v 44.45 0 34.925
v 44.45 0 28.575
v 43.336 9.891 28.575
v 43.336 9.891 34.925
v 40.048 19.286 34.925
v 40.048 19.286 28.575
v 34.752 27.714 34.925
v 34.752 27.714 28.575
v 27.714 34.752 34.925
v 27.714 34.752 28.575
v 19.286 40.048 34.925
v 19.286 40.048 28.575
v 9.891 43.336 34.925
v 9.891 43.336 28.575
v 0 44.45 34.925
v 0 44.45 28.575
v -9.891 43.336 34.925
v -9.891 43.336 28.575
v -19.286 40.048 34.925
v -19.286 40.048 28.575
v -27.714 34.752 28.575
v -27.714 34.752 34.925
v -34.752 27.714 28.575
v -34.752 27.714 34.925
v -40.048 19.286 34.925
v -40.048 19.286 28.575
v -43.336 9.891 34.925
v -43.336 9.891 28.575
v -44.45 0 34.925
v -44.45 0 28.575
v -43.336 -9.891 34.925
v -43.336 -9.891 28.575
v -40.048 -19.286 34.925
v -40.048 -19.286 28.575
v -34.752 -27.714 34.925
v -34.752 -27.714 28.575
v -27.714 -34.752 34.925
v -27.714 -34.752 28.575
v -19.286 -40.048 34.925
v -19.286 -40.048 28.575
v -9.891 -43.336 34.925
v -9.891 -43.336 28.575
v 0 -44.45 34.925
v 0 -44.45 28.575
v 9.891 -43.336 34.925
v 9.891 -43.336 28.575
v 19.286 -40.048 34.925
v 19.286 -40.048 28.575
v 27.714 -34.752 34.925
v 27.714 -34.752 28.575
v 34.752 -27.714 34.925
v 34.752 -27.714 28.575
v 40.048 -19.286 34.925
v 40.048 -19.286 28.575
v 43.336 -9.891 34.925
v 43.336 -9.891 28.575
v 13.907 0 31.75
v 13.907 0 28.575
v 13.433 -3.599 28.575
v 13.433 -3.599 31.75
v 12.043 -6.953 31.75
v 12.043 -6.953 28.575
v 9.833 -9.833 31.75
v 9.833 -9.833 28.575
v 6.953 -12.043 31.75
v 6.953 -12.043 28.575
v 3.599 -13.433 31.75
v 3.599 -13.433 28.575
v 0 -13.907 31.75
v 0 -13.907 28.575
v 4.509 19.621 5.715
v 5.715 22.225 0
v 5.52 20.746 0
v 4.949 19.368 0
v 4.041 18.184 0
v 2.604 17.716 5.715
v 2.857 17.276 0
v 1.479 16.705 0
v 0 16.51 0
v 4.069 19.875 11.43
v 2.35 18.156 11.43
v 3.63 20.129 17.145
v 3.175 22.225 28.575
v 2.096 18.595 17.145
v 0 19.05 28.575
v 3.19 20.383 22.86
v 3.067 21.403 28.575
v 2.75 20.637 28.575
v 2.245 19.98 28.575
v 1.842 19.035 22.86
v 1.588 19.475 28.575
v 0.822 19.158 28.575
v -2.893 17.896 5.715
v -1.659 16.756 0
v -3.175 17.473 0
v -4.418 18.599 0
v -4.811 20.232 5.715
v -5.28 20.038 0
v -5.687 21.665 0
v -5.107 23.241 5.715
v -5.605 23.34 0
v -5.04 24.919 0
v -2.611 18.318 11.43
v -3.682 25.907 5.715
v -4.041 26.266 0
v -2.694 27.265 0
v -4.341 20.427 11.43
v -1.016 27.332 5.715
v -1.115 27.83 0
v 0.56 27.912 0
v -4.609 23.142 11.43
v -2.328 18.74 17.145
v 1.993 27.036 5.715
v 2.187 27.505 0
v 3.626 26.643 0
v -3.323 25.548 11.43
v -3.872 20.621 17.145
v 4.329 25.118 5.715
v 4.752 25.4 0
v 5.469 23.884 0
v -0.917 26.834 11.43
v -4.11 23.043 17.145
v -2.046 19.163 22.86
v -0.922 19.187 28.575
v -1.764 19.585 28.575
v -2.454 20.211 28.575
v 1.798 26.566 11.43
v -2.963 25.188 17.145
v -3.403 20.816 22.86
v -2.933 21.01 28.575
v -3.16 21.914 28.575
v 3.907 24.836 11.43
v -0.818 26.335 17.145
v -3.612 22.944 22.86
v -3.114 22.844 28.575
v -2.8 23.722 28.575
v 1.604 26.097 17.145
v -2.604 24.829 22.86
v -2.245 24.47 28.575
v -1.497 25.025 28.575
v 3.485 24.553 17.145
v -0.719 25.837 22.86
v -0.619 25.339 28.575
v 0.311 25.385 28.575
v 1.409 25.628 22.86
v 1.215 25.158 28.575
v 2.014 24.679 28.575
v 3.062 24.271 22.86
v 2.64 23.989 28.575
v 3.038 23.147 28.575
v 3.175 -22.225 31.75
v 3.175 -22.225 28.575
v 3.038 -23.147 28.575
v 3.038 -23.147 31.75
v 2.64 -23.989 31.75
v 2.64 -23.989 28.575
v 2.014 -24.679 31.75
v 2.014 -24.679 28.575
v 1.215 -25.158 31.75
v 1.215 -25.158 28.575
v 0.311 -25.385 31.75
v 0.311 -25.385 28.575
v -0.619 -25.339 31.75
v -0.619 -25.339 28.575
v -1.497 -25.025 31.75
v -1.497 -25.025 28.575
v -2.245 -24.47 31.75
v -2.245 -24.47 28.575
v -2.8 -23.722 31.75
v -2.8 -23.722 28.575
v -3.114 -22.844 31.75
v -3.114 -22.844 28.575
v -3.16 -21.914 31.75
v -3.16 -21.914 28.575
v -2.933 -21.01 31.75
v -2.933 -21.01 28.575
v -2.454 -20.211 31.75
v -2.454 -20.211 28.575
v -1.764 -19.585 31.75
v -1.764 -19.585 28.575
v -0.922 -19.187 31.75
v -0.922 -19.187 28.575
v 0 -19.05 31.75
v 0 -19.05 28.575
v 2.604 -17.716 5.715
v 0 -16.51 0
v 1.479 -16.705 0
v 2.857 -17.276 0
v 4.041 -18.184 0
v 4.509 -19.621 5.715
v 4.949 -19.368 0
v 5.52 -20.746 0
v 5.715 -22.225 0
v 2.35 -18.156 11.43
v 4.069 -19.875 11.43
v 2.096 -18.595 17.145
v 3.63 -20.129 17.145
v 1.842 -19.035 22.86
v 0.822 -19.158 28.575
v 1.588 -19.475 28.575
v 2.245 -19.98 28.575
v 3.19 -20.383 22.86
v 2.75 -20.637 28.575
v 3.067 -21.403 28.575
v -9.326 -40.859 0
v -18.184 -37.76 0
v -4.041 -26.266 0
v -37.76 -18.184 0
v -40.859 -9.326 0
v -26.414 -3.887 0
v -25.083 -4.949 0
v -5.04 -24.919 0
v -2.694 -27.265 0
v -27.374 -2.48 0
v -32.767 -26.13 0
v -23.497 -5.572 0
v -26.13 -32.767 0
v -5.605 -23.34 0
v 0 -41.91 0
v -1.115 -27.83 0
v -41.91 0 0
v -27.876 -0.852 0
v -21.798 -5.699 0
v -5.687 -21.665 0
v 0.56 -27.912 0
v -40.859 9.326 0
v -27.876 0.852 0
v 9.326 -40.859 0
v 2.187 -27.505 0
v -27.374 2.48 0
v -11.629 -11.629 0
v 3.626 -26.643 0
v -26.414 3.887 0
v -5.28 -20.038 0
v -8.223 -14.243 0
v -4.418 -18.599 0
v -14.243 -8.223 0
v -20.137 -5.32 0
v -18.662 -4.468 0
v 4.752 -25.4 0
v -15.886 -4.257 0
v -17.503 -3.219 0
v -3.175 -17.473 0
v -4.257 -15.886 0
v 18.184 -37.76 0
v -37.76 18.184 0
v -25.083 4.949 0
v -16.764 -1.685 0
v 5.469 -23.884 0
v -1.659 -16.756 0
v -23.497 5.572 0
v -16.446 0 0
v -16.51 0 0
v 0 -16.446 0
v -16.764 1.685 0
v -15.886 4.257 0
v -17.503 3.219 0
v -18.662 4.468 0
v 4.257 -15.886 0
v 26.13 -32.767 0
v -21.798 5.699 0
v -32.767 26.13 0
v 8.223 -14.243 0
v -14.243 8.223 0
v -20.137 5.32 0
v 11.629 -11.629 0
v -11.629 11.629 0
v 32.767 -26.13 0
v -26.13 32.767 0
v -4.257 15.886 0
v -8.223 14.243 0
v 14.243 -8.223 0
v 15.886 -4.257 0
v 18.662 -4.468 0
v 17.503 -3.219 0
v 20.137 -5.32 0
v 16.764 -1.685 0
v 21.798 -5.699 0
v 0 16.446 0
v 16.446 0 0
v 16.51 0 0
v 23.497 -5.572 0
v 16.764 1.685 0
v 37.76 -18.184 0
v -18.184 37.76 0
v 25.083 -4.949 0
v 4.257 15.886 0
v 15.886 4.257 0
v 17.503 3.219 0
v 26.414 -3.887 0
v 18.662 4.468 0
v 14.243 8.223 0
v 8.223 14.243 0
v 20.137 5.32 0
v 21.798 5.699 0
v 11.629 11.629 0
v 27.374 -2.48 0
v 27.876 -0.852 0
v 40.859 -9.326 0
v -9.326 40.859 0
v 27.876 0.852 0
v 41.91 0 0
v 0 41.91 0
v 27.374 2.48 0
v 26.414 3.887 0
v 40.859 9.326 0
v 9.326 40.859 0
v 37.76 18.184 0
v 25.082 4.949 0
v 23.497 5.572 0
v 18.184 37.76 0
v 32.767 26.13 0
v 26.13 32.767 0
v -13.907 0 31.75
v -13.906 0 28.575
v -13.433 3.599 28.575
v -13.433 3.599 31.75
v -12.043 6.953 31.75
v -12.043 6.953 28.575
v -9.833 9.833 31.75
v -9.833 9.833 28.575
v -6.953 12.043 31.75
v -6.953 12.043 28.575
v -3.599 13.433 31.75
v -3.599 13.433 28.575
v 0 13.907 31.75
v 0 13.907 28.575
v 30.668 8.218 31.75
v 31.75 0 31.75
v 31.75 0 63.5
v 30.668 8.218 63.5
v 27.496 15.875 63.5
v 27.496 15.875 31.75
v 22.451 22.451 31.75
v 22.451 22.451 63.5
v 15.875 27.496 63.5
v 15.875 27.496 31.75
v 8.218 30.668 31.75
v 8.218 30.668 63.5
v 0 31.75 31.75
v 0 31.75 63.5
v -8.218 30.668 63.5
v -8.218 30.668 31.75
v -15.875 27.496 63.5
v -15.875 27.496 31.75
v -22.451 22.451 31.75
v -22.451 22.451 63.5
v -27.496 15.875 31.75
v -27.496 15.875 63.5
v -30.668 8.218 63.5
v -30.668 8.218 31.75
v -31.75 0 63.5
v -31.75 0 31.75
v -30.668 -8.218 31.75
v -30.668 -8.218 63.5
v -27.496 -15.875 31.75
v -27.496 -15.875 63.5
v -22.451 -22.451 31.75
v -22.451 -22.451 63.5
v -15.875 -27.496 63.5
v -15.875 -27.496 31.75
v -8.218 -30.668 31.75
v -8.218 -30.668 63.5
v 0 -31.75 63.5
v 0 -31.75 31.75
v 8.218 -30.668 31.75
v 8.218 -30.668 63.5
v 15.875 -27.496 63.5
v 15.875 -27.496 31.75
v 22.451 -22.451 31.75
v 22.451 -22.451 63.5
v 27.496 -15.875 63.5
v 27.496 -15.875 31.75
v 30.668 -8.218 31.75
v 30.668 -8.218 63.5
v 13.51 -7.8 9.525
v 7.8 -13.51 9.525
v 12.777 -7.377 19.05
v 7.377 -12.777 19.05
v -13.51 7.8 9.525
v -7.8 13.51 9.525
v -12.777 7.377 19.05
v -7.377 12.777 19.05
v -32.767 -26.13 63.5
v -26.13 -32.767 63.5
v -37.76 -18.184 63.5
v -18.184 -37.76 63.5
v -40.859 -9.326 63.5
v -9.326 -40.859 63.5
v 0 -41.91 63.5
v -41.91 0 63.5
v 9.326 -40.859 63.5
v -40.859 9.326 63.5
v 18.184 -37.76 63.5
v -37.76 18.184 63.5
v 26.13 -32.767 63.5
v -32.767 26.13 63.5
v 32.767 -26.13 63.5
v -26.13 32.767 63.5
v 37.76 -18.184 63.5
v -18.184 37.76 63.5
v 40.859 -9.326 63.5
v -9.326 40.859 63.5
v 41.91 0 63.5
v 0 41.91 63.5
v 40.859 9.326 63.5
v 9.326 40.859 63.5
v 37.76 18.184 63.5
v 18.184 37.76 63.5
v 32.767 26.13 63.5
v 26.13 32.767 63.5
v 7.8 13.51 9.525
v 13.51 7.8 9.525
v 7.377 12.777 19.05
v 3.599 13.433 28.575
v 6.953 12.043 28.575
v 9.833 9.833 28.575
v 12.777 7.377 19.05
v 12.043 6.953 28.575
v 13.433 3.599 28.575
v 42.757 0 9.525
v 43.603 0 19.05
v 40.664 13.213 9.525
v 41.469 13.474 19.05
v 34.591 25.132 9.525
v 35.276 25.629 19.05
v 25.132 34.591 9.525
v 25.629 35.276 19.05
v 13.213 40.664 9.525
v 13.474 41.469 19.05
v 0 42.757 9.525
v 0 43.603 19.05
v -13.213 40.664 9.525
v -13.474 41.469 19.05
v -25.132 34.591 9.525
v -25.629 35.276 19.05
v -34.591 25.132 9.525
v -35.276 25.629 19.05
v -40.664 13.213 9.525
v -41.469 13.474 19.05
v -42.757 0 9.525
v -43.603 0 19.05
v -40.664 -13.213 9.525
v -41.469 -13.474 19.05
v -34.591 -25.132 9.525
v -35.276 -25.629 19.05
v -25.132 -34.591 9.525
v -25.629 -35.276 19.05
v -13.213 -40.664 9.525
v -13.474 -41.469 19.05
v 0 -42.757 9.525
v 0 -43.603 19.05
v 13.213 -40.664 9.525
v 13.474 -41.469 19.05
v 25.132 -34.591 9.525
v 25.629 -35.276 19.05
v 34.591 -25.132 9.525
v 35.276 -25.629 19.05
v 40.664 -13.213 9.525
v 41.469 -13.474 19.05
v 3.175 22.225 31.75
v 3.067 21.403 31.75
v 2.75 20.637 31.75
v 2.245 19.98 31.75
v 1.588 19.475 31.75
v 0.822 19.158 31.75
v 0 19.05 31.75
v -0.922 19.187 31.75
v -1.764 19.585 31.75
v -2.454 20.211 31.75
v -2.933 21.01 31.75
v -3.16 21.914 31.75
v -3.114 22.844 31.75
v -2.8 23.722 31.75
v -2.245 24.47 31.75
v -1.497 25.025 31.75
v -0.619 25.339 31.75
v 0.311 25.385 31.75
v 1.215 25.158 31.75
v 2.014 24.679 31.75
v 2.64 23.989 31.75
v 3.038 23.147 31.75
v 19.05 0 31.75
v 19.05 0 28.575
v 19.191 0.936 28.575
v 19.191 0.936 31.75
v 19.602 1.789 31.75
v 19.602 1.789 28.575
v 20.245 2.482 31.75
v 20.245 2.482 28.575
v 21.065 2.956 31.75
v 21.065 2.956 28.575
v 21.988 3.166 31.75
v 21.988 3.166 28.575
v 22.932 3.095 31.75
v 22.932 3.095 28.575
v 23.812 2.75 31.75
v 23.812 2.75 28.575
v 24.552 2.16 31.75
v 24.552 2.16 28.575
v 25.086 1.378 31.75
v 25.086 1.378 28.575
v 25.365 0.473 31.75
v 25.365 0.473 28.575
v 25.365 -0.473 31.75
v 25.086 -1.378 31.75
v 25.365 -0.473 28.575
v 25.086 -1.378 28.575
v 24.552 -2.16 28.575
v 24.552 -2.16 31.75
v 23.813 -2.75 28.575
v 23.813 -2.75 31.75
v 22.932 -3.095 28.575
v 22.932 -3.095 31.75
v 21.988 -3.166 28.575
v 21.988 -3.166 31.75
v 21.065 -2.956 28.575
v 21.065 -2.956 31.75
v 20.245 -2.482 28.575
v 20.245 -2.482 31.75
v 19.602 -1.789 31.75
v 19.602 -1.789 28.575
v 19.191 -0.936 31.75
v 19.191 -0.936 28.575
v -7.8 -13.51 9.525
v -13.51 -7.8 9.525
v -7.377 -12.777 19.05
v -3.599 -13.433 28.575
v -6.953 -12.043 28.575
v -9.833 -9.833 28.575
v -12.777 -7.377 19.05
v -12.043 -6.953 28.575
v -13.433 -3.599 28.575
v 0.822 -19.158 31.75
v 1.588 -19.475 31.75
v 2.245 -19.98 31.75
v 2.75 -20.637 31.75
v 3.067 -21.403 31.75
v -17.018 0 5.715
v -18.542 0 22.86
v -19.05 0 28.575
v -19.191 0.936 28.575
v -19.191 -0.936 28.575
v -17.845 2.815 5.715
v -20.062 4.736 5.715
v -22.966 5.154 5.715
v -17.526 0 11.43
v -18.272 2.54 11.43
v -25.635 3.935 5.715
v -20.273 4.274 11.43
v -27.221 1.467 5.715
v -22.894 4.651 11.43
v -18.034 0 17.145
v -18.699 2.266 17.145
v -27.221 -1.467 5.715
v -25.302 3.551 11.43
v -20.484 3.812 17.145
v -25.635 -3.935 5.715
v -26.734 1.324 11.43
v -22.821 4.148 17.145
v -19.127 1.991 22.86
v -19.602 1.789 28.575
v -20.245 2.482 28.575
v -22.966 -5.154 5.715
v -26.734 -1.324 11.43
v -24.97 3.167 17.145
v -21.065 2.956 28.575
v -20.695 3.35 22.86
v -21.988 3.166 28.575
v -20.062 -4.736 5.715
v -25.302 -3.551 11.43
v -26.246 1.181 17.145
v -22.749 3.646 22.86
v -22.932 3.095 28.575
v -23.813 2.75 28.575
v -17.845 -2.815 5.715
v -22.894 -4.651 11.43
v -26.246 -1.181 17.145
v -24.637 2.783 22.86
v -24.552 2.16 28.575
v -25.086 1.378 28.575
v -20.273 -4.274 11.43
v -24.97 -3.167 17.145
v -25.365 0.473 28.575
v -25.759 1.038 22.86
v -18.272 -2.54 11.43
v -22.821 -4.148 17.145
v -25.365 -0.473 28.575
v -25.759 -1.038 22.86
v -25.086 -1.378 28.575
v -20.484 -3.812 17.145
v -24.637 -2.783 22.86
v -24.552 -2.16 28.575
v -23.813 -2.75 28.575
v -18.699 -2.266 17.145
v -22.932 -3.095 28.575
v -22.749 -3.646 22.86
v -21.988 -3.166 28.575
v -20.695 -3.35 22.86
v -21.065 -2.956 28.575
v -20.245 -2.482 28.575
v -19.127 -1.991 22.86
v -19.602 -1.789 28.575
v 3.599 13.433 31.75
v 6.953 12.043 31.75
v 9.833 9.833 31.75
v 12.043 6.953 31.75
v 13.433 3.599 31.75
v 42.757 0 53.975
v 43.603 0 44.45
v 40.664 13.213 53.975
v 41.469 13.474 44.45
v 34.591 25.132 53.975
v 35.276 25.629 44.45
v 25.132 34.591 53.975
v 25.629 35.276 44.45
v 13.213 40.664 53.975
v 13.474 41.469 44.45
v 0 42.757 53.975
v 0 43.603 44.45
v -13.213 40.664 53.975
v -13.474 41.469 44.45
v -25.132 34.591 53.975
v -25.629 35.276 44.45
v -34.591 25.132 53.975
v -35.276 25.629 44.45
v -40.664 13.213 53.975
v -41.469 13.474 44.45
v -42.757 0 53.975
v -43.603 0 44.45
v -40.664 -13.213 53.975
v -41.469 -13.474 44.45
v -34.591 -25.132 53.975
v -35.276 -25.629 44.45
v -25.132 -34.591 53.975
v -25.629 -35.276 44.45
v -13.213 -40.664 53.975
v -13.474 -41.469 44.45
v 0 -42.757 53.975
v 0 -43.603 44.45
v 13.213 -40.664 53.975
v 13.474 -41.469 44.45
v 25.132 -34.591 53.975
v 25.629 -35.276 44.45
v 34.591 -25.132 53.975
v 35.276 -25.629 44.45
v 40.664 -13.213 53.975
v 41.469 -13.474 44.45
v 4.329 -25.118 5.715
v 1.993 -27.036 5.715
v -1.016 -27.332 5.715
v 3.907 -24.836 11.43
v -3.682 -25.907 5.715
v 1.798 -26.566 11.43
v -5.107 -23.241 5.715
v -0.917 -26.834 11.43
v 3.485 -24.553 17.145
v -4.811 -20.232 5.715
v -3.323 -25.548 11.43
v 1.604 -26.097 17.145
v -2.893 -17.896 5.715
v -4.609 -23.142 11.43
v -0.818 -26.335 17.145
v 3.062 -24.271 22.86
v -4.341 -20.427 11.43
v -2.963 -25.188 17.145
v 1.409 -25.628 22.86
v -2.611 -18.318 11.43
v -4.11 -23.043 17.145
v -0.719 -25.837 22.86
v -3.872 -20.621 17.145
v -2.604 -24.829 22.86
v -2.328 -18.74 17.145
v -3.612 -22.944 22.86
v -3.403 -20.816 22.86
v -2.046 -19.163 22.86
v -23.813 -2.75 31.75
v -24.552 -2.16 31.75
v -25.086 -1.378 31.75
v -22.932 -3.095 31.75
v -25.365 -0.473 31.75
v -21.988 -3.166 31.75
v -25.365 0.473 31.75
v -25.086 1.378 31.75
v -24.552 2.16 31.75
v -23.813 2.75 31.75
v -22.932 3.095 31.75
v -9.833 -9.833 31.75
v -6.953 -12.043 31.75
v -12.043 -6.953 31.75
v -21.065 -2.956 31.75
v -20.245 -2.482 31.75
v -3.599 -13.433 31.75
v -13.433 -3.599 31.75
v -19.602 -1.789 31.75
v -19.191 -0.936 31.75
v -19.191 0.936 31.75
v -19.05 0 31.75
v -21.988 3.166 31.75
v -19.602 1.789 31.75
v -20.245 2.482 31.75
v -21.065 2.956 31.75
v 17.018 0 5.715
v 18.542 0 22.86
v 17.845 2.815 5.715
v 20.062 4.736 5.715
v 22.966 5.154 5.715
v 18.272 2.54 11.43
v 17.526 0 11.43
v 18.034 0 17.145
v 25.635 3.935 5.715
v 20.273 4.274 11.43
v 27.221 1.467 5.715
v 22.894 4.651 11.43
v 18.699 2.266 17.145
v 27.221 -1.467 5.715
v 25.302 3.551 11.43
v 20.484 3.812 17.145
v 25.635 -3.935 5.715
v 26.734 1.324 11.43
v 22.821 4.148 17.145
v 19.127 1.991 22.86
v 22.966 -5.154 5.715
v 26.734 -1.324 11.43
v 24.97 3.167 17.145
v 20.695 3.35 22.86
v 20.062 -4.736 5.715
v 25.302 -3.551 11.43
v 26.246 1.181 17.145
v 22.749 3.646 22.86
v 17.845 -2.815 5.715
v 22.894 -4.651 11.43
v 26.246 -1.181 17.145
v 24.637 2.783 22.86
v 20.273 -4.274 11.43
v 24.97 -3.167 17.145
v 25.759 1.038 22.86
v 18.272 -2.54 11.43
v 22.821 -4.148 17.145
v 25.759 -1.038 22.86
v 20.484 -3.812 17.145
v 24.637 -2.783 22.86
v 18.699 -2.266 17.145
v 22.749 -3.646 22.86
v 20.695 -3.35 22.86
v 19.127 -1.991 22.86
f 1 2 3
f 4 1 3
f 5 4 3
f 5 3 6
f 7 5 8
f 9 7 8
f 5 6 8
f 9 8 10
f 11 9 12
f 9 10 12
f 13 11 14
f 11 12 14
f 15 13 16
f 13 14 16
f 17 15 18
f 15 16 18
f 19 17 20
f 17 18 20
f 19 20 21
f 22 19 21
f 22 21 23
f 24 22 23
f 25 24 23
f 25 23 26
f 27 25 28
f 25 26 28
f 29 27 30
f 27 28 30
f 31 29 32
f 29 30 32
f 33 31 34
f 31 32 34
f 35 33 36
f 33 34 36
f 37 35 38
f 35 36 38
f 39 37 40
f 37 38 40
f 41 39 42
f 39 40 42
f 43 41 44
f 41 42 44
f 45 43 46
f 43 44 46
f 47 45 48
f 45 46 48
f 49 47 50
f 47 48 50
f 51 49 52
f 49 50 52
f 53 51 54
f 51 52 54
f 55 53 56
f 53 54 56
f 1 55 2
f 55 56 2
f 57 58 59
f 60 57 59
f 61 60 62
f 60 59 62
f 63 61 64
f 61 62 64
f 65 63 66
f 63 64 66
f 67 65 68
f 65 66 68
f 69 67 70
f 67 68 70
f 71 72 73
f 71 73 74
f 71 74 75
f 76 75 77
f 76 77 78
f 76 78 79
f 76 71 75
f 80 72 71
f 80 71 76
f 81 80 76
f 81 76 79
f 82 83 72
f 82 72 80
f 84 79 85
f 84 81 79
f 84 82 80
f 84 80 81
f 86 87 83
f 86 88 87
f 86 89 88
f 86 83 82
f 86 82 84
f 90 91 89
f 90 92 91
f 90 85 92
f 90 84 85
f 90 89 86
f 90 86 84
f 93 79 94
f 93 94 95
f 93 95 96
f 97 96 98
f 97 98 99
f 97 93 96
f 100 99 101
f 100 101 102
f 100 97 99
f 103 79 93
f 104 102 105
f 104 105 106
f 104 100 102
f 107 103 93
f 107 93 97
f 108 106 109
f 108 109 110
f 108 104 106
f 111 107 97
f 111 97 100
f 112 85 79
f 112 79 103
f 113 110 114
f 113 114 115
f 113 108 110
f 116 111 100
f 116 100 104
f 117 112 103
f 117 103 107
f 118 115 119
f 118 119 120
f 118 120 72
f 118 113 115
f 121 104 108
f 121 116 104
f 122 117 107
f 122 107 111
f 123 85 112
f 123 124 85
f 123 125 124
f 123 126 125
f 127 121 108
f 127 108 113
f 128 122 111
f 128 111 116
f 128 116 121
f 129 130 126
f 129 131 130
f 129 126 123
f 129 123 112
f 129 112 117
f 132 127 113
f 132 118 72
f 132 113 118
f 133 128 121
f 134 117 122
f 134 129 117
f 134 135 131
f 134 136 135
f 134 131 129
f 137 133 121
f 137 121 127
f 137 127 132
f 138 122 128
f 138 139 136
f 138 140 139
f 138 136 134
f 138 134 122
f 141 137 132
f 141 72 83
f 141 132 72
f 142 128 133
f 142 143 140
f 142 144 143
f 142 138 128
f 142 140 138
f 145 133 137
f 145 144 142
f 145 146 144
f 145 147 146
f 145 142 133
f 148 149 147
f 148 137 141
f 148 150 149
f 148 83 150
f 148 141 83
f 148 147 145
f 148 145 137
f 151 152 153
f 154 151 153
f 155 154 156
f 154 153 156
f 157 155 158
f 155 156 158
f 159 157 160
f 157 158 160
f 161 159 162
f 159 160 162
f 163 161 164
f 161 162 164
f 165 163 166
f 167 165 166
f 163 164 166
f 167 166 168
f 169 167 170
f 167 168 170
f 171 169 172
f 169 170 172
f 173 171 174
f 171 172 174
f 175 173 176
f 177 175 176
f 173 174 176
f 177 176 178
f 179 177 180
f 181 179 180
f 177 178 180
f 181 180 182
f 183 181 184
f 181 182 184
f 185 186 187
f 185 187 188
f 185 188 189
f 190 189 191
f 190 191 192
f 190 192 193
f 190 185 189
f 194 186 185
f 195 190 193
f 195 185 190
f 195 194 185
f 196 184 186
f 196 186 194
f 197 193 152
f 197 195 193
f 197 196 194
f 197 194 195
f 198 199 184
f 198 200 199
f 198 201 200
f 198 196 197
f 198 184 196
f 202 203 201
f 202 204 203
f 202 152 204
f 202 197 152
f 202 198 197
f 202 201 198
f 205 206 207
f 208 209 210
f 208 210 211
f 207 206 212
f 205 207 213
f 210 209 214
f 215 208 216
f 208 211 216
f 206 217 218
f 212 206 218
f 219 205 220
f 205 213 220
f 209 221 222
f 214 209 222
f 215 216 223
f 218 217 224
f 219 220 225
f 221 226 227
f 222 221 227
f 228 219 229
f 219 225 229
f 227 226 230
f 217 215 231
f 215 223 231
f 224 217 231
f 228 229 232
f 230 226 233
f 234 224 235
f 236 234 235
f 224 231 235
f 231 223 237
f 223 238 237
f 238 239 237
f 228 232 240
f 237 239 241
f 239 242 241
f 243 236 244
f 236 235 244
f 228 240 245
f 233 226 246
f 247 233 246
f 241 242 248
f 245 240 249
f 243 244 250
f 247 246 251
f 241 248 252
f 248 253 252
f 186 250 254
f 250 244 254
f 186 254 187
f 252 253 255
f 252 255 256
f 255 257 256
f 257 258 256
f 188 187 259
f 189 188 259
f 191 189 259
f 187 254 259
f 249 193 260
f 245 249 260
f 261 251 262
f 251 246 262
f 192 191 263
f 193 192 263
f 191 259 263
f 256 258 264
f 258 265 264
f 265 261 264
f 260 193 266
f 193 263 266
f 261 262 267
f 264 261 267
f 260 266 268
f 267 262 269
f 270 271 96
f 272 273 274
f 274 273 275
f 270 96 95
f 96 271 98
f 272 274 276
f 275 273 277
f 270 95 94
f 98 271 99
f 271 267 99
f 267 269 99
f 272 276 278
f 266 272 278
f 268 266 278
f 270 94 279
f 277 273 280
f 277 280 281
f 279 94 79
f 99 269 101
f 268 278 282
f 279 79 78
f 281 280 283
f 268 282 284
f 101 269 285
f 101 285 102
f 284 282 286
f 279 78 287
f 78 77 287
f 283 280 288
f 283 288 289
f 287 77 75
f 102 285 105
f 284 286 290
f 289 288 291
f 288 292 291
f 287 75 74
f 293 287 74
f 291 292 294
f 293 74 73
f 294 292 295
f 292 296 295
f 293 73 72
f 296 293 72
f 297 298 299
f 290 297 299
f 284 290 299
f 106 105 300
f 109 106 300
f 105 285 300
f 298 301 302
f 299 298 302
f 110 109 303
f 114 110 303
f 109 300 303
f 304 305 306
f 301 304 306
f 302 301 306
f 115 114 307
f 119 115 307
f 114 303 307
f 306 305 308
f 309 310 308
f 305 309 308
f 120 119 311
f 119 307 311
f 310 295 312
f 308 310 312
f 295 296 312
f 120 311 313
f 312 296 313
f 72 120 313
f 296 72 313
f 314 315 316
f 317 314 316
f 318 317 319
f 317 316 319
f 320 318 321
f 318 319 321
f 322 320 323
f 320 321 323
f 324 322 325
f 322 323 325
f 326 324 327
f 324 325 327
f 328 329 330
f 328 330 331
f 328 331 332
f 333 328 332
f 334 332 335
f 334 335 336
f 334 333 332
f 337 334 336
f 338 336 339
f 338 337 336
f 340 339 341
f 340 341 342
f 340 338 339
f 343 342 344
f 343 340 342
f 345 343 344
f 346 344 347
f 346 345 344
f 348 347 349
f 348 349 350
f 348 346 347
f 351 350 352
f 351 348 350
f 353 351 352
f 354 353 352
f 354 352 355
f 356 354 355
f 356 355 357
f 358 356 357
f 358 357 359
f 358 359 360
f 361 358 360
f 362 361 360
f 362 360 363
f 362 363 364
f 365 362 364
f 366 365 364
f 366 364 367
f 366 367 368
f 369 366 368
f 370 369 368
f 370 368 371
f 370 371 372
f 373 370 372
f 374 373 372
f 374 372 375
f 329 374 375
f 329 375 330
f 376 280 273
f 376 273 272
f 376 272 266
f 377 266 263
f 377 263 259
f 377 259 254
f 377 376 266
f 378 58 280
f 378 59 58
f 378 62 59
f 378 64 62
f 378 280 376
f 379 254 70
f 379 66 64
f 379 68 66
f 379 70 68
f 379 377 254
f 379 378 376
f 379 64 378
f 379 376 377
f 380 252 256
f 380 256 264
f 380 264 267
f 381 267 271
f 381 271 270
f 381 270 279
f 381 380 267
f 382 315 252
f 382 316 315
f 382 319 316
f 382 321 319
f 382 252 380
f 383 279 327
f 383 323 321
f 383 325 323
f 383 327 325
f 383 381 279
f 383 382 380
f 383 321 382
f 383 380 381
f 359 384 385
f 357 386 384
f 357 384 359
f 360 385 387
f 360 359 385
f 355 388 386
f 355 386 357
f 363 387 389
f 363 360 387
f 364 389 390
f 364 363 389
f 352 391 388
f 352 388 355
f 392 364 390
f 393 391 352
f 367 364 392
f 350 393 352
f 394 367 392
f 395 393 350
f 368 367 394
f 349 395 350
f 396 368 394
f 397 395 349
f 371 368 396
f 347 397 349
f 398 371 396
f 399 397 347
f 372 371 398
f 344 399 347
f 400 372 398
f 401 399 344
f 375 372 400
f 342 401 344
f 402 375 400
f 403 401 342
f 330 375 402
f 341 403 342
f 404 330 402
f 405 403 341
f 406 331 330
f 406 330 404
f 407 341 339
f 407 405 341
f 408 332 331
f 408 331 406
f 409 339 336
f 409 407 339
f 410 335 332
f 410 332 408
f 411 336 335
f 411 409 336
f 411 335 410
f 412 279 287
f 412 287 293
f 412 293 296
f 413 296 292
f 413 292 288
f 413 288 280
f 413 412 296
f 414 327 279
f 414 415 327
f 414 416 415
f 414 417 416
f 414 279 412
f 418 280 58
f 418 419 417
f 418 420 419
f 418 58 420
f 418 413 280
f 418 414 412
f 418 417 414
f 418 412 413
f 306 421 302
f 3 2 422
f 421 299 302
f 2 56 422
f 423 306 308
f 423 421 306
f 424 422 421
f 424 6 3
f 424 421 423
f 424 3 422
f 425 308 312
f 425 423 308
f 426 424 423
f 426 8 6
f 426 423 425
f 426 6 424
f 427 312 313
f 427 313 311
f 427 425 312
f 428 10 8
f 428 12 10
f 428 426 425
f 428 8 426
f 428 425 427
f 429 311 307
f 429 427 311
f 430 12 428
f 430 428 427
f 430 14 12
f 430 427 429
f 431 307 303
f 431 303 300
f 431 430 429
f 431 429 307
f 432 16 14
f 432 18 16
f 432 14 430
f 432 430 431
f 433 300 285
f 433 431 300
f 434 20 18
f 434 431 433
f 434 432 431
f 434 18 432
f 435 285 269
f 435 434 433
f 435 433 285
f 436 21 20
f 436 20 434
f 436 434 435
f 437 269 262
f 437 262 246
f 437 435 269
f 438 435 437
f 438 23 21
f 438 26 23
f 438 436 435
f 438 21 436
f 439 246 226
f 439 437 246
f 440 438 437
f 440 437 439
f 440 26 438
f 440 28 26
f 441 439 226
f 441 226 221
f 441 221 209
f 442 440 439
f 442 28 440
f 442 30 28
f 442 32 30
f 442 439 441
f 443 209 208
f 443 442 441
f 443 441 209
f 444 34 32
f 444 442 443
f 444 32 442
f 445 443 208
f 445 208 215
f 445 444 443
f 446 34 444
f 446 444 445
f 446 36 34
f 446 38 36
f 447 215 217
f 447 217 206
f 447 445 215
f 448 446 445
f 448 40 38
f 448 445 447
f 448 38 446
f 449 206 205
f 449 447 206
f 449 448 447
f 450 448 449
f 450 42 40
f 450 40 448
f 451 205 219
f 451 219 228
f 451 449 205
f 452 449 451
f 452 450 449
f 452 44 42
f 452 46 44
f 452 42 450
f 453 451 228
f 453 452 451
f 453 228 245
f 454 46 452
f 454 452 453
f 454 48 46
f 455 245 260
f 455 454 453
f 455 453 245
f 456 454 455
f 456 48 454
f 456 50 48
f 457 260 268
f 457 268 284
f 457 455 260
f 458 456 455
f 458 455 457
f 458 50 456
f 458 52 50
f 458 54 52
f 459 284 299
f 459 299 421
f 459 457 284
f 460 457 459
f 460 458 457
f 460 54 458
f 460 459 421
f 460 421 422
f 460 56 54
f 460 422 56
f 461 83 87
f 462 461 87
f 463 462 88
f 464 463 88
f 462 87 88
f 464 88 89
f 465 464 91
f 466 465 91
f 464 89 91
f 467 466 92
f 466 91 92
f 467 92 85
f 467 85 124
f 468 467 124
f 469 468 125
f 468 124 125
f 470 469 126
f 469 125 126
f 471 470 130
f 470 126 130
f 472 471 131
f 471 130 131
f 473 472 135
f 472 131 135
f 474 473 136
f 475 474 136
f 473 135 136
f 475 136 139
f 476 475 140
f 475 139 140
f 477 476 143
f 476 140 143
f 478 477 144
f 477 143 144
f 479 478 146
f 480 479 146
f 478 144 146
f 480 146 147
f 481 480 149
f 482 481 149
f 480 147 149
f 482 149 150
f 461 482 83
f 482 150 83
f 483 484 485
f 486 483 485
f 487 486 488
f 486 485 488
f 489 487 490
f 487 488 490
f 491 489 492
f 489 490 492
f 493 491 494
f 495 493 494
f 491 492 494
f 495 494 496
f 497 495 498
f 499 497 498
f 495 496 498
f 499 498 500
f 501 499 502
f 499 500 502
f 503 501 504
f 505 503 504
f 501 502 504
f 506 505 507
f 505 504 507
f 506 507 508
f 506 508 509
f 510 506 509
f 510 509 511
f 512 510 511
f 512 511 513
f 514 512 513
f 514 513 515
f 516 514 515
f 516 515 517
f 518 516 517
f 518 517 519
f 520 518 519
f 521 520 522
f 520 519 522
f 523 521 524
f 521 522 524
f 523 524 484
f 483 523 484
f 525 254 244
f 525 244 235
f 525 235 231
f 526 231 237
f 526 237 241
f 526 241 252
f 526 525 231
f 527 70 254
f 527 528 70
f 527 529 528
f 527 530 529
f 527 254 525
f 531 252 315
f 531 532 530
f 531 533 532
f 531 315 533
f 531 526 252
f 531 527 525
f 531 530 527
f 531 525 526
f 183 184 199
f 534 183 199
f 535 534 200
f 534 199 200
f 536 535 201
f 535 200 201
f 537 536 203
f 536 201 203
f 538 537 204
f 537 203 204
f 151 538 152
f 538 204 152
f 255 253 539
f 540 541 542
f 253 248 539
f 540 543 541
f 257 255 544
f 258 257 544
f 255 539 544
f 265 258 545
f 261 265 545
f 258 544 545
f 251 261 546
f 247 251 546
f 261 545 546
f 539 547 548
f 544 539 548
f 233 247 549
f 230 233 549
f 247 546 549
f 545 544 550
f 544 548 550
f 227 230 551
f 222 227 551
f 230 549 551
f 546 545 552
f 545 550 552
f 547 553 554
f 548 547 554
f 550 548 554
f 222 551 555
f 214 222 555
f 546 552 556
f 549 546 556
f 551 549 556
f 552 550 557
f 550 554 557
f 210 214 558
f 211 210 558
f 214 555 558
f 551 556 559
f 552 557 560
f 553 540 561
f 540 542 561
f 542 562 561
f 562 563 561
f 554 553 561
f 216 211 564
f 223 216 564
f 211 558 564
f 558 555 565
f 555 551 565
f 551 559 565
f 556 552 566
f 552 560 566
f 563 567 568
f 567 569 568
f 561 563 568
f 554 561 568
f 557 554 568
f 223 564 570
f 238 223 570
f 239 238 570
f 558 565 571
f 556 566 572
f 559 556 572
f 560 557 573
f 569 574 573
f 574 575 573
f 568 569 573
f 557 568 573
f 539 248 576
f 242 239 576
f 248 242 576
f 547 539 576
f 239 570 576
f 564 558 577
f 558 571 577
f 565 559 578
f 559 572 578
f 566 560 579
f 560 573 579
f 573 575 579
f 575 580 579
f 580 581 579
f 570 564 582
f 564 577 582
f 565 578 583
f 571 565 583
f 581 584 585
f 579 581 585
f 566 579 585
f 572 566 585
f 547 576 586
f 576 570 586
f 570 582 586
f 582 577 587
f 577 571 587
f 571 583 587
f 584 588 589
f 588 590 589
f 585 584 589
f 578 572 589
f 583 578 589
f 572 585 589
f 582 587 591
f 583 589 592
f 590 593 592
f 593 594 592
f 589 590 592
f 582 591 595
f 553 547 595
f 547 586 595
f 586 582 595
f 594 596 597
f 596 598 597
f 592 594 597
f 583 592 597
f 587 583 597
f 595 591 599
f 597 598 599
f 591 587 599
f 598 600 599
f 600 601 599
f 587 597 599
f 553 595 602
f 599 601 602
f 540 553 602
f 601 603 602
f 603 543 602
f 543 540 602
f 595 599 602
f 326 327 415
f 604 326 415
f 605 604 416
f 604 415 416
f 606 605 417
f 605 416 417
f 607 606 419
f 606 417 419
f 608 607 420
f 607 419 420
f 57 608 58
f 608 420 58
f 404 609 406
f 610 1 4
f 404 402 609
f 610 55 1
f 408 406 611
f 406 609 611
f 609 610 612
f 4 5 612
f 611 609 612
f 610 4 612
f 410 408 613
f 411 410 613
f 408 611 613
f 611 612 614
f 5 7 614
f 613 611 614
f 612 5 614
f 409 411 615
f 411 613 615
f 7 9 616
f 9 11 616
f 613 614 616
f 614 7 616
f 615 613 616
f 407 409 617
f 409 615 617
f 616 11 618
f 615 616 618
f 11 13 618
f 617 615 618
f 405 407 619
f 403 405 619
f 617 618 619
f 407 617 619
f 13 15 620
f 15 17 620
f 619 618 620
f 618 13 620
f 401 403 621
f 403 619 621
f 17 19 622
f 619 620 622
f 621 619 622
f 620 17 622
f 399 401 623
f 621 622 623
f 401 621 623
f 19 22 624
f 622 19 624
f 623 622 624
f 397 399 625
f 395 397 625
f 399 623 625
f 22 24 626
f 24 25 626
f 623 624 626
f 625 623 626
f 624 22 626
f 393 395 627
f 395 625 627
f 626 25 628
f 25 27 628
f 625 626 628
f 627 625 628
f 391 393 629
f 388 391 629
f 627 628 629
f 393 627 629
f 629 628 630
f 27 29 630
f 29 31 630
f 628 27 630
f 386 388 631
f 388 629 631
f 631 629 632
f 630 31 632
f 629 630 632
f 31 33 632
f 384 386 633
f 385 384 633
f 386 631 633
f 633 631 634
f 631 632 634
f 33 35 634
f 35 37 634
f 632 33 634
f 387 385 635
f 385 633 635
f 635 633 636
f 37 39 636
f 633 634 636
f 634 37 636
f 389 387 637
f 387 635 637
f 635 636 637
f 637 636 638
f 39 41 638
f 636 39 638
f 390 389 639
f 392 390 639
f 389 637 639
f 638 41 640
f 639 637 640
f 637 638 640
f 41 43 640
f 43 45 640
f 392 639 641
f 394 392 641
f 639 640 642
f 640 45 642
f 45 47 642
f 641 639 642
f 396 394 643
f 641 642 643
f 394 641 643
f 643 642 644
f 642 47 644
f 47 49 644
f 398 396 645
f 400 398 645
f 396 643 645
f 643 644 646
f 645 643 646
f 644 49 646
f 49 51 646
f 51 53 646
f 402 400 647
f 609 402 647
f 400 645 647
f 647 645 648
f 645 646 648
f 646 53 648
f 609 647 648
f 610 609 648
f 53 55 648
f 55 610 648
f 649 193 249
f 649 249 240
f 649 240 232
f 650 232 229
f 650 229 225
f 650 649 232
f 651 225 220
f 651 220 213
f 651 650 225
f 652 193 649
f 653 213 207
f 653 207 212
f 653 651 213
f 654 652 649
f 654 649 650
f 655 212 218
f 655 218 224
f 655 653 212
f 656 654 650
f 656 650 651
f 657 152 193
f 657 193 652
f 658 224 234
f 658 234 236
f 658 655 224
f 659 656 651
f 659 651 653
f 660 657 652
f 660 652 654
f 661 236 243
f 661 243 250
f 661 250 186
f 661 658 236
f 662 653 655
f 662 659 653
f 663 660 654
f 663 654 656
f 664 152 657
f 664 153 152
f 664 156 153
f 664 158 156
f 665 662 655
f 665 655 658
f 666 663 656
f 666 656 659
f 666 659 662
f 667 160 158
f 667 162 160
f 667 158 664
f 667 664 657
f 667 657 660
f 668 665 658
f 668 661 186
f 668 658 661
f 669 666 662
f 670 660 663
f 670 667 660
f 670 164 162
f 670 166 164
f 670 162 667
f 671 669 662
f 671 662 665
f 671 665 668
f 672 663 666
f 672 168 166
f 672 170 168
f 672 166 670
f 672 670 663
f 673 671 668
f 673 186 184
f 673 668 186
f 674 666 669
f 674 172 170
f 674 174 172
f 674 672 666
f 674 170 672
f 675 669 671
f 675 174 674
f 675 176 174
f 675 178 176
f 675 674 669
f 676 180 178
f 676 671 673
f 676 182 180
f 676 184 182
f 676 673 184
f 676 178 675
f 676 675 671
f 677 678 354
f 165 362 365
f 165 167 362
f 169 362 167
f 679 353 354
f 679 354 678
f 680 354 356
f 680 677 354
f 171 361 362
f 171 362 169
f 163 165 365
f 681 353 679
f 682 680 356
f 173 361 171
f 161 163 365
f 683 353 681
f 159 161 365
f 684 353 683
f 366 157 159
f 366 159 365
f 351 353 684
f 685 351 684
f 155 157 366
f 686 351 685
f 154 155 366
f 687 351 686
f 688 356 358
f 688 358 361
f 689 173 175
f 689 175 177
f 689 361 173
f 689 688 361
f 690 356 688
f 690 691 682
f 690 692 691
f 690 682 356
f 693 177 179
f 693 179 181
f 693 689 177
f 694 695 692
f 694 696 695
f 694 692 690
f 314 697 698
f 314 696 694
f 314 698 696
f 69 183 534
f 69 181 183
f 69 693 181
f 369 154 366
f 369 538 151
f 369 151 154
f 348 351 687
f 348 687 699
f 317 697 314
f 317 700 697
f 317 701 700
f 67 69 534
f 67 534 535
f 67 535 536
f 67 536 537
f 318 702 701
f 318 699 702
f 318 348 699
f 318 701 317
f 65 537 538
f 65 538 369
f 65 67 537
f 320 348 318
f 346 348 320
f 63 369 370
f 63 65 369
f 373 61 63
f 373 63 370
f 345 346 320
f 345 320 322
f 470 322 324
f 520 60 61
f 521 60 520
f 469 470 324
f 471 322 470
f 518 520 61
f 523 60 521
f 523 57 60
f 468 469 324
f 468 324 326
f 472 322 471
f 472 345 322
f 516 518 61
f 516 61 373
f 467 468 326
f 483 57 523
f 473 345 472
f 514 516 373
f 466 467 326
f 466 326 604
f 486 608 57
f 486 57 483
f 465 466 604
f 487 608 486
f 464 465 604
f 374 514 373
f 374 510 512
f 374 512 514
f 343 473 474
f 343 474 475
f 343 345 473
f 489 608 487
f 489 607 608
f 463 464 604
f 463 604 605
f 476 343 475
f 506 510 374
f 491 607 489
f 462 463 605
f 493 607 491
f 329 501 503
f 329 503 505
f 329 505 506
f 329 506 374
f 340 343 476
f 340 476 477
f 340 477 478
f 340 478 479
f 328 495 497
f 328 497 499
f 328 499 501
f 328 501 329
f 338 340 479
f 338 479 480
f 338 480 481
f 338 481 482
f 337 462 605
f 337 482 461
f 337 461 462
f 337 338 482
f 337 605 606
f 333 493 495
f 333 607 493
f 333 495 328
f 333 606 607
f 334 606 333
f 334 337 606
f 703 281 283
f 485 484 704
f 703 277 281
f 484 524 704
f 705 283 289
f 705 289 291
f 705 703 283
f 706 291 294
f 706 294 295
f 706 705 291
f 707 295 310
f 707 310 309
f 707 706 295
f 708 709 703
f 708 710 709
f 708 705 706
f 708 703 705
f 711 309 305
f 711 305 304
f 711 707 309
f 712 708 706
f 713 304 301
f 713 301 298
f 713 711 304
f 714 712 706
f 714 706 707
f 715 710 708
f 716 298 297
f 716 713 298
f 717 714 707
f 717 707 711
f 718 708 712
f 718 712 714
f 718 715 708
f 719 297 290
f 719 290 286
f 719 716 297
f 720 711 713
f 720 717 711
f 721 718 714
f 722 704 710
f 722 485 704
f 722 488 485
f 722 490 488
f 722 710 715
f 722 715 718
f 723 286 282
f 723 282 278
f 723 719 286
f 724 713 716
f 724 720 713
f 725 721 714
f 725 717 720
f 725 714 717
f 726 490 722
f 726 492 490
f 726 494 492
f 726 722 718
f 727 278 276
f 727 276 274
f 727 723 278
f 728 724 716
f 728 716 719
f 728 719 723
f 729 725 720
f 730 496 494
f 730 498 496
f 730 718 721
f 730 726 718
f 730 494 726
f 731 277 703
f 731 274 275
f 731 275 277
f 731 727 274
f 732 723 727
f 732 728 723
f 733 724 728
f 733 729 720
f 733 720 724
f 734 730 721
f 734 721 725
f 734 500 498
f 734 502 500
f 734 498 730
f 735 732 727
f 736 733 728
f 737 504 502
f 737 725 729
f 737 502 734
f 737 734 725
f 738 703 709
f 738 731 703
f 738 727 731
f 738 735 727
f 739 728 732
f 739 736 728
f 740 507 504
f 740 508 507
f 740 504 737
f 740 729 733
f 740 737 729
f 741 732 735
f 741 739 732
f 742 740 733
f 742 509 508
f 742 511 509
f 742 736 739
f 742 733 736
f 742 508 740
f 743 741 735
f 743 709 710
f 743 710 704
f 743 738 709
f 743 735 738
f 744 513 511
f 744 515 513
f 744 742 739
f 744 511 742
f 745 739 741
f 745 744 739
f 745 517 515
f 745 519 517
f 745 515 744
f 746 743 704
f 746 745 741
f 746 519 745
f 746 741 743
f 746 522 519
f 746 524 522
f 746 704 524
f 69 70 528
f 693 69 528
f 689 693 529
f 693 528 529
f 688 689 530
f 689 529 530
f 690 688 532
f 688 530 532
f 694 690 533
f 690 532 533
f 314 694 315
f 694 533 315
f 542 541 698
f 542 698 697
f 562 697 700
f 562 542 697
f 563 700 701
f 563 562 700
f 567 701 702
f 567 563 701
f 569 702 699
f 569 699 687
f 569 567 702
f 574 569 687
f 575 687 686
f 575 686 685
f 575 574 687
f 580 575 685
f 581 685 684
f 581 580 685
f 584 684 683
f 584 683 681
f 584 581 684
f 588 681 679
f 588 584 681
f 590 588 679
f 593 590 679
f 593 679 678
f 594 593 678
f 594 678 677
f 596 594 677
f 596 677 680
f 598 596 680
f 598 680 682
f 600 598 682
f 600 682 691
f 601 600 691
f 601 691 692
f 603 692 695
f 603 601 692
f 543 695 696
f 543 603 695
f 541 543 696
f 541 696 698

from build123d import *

# Parameters (mm, degrees)
F0_R     = 31.75
F0_R_2   = 3.175
F1_DEPTH = 31.75
F0_R_3   = 44.45
F2_DEPTH = 63.5
F3_SIZE2 = 28.575
F3_SIZE  = 2.54
F4_SIZE2 = 28.575
F4_SIZE  = 2.54


with BuildPart() as f1:
    # F0 (on Top) → F1 (new body)
    with BuildSketch(Plane.XY):
        Circle(F0_R)
        with BuildLine():
            ThreePointArc((3.175, -22.225), (-2.2450640303, -24.4700640303), (0, -19.05))
            ThreePointArc((0, -19.05), (2.2450640303, -19.9799359697), (3.175, -22.225))
        make_face(mode=Mode.SUBTRACT)
        with Locations((-22.225, 0)):
            Circle(F0_R_2, mode=Mode.SUBTRACT)
        with BuildLine():
            ThreePointArc((0, 13.9065), (9.8333804526, 9.8333804526), (13.9065, 0))
            ThreePointArc((13.9065, 0), (9.8333804526, -9.8333804526), (0, -13.9065))
            ThreePointArc((0, -13.9065), (-9.8333804526, -9.8333804526), (-13.9065, 0))
            ThreePointArc((-13.9065, 0), (-9.8333804526, 9.8333804526), (0, 13.9065))
        make_face(mode=Mode.SUBTRACT)
        with BuildLine():
            ThreePointArc((25.4, 0), (22.225, -3.175), (19.05, 0))
            ThreePointArc((19.05, 0), (22.225, 3.175), (25.4, 0))
        make_face(mode=Mode.SUBTRACT)
        with BuildLine():
            ThreePointArc((3.175, 22.225), (2.2450640303, 19.9799359697), (0, 19.05))
            ThreePointArc((0, 19.05), (-2.2450640303, 24.4700640303), (3.175, 22.225))
        make_face(mode=Mode.SUBTRACT)
    extrude(amount=F1_DEPTH)

    # F0 (on Top) → F2 (join)
    with BuildSketch(Plane.XY):
        Circle(F0_R_3)
        Circle(F0_R, mode=Mode.SUBTRACT)
    extrude(amount=F2_DEPTH)

    # F3
    f3_edges = [f1.edges().sort_by_distance(p)[0] for p in [
        (-44.45, 0, 63.5),
    ]]
    f3_side = f1.faces().sort_by_distance((-43.192764, 0, 63.5))[0]
    chamfer(f3_edges, length=F3_SIZE, length2=F3_SIZE2, reference=f3_side)

    # F4
    f4_edges = [f1.edges().sort_by_distance(p)[0] for p in [
        (0, -25.4, 0),
        (-25.4, 0, 0),
        (-13.9065, 0, 0),
        (19.05, 0, 0),
        (-3.175, 22.225, 0),
        (-44.45, 0, 0),
    ]]
    f4_side = f1.faces().sort_by_distance((0, -26.657236, 0))[0]
    chamfer(f4_edges, length=F4_SIZE, length2=F4_SIZE2, reference=f4_side)


solid = f1.part
